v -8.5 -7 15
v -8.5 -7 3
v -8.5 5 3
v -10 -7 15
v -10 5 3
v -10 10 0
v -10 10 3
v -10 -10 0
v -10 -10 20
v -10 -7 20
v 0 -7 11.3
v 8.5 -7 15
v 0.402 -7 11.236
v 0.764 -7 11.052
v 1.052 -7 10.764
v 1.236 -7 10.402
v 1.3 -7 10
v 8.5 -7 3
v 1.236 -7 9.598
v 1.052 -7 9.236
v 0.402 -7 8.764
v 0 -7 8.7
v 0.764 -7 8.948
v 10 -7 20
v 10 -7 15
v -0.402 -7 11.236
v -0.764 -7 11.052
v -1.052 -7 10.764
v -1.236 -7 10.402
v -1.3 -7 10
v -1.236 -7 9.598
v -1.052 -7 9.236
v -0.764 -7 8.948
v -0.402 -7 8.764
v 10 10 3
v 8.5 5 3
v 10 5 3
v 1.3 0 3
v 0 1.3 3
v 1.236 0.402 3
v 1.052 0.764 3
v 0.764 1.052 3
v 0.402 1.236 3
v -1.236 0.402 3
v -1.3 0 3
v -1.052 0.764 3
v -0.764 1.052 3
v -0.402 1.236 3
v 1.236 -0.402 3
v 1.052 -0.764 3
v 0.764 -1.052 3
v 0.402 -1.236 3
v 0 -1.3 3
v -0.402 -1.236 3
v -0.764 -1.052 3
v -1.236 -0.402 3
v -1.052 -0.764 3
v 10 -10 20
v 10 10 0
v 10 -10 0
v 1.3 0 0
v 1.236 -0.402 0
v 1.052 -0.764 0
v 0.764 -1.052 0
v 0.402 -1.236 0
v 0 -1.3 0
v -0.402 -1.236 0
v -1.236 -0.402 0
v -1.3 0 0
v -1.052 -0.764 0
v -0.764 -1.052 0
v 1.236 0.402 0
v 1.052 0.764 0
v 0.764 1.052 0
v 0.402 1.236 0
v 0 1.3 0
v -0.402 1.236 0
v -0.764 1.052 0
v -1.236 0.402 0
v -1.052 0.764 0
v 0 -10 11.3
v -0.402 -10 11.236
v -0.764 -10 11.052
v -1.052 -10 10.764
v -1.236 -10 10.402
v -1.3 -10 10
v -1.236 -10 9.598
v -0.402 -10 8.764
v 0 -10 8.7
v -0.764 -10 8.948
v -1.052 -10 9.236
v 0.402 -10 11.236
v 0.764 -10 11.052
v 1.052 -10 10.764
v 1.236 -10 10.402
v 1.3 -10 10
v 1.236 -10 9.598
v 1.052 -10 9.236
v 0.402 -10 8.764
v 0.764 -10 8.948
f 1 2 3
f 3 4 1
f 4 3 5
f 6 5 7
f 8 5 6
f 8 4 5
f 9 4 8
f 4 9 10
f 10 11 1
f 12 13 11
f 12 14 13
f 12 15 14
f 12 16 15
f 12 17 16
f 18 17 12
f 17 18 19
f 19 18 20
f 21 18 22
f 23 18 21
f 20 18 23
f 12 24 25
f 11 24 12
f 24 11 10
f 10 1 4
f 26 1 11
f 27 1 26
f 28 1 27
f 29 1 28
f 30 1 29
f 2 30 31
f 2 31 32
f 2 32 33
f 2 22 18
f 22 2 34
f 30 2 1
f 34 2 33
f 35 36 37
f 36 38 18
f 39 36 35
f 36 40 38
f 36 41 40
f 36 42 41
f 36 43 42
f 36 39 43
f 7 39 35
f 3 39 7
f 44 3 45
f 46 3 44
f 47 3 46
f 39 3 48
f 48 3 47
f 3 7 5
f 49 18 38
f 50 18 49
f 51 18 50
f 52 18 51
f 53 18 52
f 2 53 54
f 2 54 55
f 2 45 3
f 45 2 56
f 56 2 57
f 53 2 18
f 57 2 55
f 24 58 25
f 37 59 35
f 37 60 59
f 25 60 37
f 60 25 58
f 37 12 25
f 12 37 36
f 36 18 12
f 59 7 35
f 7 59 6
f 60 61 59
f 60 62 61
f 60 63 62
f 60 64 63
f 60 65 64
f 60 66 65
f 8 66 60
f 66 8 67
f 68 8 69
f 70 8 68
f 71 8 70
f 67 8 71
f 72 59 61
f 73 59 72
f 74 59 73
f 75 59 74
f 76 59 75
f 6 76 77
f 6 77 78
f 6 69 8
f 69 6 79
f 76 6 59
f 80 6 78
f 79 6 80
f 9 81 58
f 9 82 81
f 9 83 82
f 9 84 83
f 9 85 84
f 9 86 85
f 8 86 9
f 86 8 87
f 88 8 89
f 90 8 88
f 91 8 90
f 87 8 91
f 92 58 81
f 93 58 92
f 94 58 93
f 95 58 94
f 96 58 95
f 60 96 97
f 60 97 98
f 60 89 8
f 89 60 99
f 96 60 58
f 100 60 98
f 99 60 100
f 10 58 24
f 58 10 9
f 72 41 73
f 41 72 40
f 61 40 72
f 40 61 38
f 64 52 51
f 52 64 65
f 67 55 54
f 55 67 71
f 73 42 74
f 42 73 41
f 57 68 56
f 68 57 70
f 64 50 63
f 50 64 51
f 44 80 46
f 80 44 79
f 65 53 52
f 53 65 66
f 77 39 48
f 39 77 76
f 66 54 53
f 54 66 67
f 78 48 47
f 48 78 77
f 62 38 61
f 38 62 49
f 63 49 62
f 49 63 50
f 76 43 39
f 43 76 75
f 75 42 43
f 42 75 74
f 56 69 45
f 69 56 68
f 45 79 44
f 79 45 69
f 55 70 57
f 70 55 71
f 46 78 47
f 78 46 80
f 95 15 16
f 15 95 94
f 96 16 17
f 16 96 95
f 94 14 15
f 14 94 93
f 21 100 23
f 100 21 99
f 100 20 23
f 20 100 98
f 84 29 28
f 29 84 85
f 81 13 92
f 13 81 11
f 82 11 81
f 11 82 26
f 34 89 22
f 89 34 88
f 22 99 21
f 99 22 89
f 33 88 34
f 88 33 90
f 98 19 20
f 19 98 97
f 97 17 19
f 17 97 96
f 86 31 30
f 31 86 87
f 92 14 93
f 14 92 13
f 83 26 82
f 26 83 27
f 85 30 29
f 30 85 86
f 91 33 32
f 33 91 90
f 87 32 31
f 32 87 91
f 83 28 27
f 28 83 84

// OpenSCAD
//preview[view:east,tilt:top]

/*Customizer Variables*/

// The length of the X arm in mm
x_length = 20; //[20,40,60,80]

// The length of the Y arm in mm
y_length = 20; //[20,40,60,80]

// The width of the part
width = 20; //[20,40,60,80]

// The thickness of the arms in mm
z_length = 3;

// The angle of the bracket
angle = 90.0; //[0:1:180]

// The thickness of the webbing as a fraction of the z_height
web_thickness = 0.5; // [0.05:0.05:1]

// The fraction of the x or y length the webbing extends to. 
web_length = 0.75; // [0.05:0.05:1]

// Screw size in mm 
screw_size = 2;

hole_size = screw_size + screw_size/10 + 0.4;

print_part();

module print_part() {

  {translate([-width/2, -y_length/2,0])
    difference ()
    {
      union ()
      {
        // extrude webbing
        {translate([z_length * web_thickness,0,0])
          rotate([0,-90,0])
            linear_extrude(height = z_length * web_thickness, center = false)
             polygon([[z_length, (z_length / sin(angle)) + (z_length / tan(angle))],
                [z_length, (y_length - 0) * web_length],
                [sin(angle) * x_length * web_length - cos(angle) * z_length, 
                 cos(angle) * x_length * web_length + sin(angle) * z_length]]);}

         {translate([width ,0,0])
           rotate([0,-90,0])
             linear_extrude(height = z_length * web_thickness, center = false)
             polygon([[z_length, (z_length / sin(angle)) + (z_length / tan(angle))],
                [z_length, (y_length - 0) * web_length],
                [sin(angle) * x_length * web_length - cos(angle) * z_length, 
                 cos(angle) * x_length * web_length + sin(angle) * z_length]]);}

             /*
             polygon([[0,0], [0,y_length * web_length],
                 [sin(angle)*x_length * web_length, cos(angle) * x_length * web_length]]);}*/

         {translate([width,0,0])
           rotate([0,-90,0])
             linear_extrude(height = width, center = false)
             polygon([[0,0],[0,y_length],
                 [z_length,y_length], 
                 [z_length, (z_length / sin(angle)) + (z_length / tan(angle))],
                 [sin(angle) * x_length - cos(angle) * z_length, cos(angle) * x_length + sin(angle) * z_length],
                 [sin(angle) * x_length, cos(angle) * x_length]]);}}

         // drill bottom hole    
         {
             for(stepy=[10:20:70])
             for(stepw=[10:20:70])
              if(stepy < y_length && stepw < width)
           translate([stepw, stepy, -0.10])
           cylinder(80 + 0.2, hole_size * 0.5, hole_size * 0.5, false, $fn=20);}

         // drill top hole
         {translate([0, sin(angle) * z_length, -cos(angle) * z_length])
           rotate([angle,0,0])
           { for(stepy=[10:20:70])
             for(stepw=[10:20:70])
              if(stepy < x_length && stepw < width)
           translate([stepw, stepy, z_length - y_length ])
             cylinder(80 + 0.2, hole_size * 0.5, hole_size * 0.5, false, $fn=20);}}}}}
